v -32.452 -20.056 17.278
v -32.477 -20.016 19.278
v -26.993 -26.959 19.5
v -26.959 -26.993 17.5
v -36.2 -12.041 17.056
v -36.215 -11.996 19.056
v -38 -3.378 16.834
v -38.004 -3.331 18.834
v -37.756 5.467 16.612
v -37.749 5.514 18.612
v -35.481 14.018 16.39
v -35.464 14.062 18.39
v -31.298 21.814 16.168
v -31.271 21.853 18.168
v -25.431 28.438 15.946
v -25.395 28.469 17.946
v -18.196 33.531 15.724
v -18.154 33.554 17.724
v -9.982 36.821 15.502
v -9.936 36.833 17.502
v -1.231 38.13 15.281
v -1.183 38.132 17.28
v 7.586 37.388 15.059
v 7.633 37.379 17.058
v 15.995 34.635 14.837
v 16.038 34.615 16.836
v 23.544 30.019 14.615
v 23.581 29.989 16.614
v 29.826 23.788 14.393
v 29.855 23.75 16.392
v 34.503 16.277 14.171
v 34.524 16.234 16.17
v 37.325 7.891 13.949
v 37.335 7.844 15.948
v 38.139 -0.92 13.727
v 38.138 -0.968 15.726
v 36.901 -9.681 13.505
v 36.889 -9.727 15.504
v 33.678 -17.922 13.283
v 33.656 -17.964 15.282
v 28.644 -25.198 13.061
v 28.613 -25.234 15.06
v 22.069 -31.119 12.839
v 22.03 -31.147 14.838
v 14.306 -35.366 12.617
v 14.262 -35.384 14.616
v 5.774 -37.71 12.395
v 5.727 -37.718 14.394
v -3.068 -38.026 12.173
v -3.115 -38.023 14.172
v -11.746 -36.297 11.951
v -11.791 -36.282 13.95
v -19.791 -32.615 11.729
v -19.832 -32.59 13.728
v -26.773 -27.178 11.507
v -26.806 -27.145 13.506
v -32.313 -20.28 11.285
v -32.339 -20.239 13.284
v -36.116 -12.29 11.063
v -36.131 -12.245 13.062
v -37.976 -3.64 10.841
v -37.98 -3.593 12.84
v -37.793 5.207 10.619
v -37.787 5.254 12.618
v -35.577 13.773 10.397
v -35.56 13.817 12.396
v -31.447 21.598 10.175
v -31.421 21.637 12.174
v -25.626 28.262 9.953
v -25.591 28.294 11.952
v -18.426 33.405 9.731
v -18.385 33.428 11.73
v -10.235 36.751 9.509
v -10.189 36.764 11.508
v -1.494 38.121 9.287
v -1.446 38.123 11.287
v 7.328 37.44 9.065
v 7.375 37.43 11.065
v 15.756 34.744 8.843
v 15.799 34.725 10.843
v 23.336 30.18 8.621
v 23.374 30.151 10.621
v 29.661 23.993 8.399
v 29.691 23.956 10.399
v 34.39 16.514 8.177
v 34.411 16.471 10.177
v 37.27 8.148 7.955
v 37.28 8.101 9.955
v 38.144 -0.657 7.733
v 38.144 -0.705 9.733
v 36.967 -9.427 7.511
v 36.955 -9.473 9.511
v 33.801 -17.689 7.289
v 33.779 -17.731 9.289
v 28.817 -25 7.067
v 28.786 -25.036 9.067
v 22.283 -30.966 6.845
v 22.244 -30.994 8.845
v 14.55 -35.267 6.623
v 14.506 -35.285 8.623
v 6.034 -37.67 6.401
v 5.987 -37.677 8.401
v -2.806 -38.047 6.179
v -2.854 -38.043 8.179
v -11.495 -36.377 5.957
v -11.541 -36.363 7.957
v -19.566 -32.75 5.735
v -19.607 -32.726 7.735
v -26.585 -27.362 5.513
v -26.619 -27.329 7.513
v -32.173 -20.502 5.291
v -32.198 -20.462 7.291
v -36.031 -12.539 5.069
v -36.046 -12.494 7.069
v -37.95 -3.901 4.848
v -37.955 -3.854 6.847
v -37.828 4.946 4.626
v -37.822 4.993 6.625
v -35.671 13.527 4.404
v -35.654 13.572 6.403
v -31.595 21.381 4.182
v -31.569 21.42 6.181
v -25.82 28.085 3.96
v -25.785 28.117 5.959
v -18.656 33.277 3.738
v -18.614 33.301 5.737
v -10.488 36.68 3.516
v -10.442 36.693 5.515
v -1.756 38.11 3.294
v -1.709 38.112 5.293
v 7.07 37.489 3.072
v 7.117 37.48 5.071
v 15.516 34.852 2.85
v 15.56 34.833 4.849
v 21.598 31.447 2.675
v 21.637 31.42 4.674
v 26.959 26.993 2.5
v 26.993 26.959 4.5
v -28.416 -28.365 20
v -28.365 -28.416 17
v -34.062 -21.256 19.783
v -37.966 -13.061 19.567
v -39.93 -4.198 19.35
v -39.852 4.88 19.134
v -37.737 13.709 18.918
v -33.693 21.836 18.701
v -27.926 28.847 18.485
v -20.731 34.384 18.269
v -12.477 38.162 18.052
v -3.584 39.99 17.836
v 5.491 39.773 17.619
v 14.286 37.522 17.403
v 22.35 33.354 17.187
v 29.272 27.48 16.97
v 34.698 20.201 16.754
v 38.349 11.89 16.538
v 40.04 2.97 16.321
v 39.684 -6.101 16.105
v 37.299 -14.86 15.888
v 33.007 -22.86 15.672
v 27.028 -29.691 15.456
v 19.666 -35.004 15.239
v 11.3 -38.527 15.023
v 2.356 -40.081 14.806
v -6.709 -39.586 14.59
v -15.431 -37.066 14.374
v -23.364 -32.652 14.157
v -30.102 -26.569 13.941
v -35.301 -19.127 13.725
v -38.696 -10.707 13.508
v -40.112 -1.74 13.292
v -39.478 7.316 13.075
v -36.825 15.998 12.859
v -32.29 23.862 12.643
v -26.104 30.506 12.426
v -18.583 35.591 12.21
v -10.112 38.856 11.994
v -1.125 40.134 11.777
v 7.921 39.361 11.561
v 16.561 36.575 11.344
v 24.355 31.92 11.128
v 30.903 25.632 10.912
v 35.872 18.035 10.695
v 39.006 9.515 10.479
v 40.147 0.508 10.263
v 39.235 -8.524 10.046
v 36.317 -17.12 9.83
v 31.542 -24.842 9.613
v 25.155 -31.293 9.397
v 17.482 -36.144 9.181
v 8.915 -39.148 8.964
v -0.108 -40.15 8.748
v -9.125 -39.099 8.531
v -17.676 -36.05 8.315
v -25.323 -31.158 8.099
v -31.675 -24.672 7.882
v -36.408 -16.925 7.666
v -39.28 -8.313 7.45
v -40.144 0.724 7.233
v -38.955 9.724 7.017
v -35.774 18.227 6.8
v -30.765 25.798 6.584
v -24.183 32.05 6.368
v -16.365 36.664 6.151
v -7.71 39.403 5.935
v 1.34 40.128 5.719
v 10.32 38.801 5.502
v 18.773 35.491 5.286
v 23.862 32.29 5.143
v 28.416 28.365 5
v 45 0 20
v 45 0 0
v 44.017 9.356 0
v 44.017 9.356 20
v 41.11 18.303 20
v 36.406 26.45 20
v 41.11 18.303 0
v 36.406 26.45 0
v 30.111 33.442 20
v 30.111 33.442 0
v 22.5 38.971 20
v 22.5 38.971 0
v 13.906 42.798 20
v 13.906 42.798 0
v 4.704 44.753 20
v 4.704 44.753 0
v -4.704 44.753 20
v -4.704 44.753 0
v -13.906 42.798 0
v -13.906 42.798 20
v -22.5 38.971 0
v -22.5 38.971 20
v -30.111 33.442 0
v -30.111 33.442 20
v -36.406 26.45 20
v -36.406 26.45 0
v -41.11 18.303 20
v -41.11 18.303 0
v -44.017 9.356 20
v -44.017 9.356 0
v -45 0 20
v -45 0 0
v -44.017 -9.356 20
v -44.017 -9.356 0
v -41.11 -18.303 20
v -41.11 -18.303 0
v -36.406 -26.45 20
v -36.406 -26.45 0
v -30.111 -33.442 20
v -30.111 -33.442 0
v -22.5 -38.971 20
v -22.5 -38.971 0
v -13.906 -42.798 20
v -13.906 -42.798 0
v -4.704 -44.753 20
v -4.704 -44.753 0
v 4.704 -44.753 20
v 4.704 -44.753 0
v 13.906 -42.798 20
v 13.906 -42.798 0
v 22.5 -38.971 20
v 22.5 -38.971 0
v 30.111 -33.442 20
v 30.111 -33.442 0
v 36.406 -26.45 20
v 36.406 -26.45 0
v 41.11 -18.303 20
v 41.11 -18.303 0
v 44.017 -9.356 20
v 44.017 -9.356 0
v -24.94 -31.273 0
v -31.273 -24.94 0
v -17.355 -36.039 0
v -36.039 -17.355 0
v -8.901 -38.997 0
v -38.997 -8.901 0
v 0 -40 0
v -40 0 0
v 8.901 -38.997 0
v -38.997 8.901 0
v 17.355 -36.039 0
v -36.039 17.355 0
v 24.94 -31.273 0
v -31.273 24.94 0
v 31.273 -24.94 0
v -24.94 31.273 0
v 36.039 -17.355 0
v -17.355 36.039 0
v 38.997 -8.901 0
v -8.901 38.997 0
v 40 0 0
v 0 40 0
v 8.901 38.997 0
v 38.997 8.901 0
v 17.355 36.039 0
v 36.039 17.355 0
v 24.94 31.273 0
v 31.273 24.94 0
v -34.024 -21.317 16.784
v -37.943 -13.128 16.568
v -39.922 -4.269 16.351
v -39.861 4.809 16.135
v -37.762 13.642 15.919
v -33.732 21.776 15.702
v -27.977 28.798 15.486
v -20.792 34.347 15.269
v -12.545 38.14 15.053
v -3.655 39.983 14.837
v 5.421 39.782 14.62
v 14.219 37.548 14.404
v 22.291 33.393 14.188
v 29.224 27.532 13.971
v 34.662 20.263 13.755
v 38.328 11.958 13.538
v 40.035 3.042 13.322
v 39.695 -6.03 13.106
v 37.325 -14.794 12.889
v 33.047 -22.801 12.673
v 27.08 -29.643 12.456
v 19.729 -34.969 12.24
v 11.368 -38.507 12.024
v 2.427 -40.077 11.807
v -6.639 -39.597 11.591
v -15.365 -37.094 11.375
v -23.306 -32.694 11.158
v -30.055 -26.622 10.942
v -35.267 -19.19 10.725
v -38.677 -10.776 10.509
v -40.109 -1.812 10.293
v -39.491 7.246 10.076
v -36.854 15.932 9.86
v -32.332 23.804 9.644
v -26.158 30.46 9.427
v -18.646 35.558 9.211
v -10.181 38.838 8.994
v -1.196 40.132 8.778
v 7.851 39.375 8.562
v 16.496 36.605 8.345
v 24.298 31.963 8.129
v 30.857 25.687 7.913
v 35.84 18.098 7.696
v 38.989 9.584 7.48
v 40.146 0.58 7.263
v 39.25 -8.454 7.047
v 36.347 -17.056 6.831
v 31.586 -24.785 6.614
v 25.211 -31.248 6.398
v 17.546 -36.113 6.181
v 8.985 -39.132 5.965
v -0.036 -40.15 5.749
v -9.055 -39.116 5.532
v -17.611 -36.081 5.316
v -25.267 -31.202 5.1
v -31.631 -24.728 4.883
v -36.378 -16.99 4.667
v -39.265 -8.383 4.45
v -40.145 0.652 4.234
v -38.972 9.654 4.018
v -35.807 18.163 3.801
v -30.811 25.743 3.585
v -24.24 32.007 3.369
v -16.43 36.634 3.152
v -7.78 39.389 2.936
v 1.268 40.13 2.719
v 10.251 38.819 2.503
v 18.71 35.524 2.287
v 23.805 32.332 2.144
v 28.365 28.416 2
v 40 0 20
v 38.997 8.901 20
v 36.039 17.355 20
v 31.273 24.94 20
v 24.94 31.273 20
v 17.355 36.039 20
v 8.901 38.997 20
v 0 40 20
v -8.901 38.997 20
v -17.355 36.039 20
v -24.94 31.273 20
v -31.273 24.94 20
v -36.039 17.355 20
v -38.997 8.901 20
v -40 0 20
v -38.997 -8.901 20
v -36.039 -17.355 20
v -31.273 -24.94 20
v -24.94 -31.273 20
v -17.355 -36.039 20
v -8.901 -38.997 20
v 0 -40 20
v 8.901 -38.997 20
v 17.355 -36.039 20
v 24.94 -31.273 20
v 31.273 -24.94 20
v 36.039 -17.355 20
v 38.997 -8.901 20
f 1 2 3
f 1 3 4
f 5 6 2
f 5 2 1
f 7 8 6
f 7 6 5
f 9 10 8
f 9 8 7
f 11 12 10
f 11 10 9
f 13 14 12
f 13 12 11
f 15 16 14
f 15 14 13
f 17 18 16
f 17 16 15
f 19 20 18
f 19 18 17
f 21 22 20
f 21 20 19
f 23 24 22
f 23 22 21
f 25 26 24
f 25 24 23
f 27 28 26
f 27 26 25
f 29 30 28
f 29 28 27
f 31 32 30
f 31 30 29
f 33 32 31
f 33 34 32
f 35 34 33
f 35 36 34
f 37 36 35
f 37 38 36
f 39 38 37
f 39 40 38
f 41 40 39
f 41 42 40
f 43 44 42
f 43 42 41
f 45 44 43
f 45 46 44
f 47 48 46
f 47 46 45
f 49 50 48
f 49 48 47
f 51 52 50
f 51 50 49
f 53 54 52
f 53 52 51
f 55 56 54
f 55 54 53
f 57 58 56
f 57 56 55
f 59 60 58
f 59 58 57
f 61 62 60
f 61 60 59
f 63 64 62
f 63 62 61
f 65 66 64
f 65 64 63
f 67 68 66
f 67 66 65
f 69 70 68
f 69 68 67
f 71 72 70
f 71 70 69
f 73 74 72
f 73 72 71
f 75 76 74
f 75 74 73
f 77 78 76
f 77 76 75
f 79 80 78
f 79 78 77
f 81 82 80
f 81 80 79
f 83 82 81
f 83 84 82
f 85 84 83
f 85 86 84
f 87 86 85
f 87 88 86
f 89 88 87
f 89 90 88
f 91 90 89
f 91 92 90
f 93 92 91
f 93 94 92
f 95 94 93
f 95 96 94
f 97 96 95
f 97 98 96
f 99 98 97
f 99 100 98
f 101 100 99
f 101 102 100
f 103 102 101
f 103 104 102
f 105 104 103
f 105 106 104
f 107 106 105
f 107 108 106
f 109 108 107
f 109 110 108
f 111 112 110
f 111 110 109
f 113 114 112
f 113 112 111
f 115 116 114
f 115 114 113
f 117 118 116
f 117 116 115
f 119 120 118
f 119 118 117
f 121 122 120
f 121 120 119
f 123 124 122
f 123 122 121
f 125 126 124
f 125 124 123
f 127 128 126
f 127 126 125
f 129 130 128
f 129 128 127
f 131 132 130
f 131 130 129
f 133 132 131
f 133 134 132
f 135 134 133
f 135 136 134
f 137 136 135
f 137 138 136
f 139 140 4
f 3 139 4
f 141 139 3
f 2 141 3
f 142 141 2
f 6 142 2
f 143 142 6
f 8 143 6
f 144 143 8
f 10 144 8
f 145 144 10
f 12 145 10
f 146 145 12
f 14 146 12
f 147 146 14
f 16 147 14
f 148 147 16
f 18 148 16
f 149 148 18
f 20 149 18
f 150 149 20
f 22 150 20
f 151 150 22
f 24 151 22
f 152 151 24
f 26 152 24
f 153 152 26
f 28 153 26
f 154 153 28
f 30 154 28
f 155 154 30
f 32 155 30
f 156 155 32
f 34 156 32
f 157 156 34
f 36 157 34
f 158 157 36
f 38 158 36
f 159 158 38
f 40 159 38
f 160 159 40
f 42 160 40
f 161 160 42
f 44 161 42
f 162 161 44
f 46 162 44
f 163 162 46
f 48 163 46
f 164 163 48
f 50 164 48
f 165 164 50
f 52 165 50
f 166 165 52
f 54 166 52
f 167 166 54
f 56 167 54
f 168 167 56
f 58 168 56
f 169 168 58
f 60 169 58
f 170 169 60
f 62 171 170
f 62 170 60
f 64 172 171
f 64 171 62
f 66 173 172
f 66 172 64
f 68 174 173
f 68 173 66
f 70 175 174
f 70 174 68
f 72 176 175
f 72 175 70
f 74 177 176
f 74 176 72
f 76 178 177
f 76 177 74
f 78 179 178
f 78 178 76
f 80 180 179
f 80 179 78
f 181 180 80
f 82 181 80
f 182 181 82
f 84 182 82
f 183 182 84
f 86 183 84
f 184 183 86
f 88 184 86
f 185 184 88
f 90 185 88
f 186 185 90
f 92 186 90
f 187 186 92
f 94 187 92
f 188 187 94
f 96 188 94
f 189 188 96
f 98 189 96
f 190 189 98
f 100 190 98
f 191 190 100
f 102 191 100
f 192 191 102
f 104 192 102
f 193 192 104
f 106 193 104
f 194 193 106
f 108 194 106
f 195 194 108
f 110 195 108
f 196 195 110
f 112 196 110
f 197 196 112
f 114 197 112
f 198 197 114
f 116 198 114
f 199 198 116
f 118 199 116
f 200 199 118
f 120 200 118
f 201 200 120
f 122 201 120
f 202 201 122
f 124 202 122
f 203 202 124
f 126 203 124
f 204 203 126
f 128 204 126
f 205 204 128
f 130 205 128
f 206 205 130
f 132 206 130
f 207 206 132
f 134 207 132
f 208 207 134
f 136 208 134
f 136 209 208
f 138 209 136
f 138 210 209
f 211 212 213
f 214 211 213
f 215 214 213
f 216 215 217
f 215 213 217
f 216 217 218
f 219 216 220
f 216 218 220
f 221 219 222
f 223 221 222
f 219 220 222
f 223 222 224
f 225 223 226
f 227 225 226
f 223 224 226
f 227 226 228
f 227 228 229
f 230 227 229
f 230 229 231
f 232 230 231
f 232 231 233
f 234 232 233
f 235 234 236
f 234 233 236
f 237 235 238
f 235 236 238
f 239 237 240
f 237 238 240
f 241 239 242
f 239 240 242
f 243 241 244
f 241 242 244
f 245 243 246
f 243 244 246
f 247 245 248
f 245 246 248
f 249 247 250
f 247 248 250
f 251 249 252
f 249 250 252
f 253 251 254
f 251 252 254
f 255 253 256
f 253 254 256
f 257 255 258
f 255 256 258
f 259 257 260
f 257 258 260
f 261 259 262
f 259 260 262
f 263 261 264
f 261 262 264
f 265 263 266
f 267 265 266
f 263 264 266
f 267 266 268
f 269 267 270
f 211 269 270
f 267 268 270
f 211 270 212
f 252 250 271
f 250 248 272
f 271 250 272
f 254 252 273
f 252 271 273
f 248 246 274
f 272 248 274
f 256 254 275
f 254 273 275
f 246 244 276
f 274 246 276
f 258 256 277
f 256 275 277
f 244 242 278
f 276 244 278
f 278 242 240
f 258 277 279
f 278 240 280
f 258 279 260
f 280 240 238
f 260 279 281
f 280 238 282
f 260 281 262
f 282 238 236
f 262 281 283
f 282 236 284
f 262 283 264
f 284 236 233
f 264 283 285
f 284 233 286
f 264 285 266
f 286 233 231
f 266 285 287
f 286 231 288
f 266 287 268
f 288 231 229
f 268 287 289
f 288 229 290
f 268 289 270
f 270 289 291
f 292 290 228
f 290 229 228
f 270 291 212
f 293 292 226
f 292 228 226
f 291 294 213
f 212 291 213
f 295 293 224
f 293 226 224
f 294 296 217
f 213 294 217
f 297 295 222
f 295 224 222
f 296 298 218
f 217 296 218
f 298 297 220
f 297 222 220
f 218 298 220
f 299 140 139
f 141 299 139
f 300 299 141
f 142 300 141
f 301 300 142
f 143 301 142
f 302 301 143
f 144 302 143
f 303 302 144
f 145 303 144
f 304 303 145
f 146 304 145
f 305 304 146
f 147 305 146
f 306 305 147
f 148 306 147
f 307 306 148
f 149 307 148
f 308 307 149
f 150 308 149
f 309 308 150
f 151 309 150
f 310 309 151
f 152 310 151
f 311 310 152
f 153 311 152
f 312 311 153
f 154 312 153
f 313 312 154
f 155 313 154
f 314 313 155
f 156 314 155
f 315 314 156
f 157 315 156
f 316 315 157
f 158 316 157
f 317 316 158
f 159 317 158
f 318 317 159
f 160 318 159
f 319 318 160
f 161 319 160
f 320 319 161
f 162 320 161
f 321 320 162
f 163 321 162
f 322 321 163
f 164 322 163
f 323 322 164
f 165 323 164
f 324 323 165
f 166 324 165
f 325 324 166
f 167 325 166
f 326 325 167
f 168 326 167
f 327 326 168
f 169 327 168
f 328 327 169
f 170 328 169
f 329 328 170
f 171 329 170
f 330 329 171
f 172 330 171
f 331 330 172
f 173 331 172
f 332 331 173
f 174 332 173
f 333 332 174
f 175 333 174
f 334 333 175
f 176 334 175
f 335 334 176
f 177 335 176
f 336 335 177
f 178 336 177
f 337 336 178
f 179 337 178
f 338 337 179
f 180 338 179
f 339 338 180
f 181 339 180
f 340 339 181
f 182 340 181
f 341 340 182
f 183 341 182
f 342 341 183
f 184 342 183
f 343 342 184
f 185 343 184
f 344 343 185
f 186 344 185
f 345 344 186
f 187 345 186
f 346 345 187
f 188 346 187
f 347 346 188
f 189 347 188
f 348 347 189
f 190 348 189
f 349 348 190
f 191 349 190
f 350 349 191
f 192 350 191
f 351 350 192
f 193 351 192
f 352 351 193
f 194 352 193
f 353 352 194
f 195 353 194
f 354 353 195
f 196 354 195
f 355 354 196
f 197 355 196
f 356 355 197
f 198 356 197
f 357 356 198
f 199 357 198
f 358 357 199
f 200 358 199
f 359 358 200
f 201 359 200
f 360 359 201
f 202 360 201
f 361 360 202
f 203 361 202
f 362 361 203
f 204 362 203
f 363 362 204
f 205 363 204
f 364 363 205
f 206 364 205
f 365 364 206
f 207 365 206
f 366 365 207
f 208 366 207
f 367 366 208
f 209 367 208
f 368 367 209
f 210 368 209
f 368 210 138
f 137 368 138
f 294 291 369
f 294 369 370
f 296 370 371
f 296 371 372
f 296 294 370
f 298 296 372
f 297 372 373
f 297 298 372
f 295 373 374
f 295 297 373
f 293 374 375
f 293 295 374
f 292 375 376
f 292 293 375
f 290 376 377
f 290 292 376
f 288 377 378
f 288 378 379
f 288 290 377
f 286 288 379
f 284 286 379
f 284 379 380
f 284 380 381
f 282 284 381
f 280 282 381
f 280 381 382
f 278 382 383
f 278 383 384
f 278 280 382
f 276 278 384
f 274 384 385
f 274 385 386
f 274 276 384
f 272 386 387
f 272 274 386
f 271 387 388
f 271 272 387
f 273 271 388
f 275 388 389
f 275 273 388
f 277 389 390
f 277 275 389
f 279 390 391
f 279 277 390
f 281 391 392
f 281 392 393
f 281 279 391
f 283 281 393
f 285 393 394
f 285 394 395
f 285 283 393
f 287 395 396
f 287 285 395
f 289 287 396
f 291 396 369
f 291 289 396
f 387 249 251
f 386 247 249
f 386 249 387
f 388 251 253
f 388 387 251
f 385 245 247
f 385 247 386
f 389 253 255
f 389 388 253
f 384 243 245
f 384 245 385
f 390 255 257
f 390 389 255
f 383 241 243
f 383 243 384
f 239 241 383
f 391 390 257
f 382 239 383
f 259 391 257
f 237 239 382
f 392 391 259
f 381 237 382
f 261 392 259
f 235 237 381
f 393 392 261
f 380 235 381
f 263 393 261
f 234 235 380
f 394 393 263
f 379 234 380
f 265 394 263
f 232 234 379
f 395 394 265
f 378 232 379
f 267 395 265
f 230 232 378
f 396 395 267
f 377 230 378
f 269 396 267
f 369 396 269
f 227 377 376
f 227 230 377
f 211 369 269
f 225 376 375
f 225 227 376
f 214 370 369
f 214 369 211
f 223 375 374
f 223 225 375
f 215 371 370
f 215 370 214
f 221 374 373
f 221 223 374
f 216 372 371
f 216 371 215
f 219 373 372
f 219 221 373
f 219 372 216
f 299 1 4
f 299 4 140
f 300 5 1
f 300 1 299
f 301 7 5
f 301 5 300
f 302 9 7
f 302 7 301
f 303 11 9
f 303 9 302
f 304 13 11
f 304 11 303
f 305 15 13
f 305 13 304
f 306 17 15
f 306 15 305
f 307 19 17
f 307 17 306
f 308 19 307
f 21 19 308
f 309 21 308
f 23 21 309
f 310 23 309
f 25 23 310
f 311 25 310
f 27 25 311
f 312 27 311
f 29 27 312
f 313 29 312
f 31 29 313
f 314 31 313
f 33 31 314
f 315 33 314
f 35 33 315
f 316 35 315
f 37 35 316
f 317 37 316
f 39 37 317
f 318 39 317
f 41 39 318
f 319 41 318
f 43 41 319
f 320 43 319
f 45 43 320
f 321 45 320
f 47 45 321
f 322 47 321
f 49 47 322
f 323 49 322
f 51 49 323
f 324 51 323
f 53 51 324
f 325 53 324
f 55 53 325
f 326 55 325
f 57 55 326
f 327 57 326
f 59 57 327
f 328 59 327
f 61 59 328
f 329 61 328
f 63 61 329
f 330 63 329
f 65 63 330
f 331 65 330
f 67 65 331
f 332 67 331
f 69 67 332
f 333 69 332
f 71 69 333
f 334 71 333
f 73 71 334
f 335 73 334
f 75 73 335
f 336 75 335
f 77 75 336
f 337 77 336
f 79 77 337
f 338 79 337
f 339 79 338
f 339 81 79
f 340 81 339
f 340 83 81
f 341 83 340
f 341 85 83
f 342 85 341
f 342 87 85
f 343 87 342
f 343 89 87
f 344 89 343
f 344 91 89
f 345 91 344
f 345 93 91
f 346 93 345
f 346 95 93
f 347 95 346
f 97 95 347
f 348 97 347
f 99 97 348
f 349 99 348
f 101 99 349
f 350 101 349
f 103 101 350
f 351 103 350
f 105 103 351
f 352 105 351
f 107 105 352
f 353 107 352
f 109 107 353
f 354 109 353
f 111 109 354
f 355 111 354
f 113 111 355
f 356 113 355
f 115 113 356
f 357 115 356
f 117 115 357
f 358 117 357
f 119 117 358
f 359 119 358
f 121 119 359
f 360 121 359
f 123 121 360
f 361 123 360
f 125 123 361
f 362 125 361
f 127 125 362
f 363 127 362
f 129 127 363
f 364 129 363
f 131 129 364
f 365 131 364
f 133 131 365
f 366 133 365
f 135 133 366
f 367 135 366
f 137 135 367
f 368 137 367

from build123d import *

# Parameters (mm, degrees)
SKETCH_1_R          = 45
SKETCH_1_R_2        = 40
EXTRUDE_1_DEPTH     = 20
SWEEP_1_PITCH       = 6
SWEEP_1_HEIGHT      = 15
SWEEP_1_RADIUS      = 40.15
SWEEP_1_START_ANGLE = -45


with BuildPart() as part:
    # 草图1 → 凸台-拉伸1 (new body)
    with BuildSketch(Plane.XY):
        Circle(SKETCH_1_R)
        Circle(SKETCH_1_R_2, mode=Mode.SUBTRACT)
    extrude(amount=EXTRUDE_1_DEPTH)


with BuildPart() as body_2:
    # 扫描1: sweep along a helix
    with BuildLine() as sweep_1_path:
        add(Helix(SWEEP_1_PITCH, SWEEP_1_HEIGHT, SWEEP_1_RADIUS, center=(0, 0, 18.5), direction=(0, 0, -1), mode=Mode.PRIVATE).rotate(Axis((0, 0, 18.5), (0, 0, -1)), SWEEP_1_START_ANGLE))
    # 草图3 → 扫描1 (sweep)
    with BuildSketch(Plane(origin=(-28.390337265, -28.390337265, 18.5), x_dir=(-0.016813109, 0.016813109, 0.999717279), z_dir=(-0.706906868, 0.706906868, -0.023777327))):
        Polygon((1.5, 0), (-1.5, 0), (-1, 2), (1, 2), align=None)
    sweep(path=sweep_1_path.line, is_frenet=True)


solid = Compound([part.part, body_2.part])
